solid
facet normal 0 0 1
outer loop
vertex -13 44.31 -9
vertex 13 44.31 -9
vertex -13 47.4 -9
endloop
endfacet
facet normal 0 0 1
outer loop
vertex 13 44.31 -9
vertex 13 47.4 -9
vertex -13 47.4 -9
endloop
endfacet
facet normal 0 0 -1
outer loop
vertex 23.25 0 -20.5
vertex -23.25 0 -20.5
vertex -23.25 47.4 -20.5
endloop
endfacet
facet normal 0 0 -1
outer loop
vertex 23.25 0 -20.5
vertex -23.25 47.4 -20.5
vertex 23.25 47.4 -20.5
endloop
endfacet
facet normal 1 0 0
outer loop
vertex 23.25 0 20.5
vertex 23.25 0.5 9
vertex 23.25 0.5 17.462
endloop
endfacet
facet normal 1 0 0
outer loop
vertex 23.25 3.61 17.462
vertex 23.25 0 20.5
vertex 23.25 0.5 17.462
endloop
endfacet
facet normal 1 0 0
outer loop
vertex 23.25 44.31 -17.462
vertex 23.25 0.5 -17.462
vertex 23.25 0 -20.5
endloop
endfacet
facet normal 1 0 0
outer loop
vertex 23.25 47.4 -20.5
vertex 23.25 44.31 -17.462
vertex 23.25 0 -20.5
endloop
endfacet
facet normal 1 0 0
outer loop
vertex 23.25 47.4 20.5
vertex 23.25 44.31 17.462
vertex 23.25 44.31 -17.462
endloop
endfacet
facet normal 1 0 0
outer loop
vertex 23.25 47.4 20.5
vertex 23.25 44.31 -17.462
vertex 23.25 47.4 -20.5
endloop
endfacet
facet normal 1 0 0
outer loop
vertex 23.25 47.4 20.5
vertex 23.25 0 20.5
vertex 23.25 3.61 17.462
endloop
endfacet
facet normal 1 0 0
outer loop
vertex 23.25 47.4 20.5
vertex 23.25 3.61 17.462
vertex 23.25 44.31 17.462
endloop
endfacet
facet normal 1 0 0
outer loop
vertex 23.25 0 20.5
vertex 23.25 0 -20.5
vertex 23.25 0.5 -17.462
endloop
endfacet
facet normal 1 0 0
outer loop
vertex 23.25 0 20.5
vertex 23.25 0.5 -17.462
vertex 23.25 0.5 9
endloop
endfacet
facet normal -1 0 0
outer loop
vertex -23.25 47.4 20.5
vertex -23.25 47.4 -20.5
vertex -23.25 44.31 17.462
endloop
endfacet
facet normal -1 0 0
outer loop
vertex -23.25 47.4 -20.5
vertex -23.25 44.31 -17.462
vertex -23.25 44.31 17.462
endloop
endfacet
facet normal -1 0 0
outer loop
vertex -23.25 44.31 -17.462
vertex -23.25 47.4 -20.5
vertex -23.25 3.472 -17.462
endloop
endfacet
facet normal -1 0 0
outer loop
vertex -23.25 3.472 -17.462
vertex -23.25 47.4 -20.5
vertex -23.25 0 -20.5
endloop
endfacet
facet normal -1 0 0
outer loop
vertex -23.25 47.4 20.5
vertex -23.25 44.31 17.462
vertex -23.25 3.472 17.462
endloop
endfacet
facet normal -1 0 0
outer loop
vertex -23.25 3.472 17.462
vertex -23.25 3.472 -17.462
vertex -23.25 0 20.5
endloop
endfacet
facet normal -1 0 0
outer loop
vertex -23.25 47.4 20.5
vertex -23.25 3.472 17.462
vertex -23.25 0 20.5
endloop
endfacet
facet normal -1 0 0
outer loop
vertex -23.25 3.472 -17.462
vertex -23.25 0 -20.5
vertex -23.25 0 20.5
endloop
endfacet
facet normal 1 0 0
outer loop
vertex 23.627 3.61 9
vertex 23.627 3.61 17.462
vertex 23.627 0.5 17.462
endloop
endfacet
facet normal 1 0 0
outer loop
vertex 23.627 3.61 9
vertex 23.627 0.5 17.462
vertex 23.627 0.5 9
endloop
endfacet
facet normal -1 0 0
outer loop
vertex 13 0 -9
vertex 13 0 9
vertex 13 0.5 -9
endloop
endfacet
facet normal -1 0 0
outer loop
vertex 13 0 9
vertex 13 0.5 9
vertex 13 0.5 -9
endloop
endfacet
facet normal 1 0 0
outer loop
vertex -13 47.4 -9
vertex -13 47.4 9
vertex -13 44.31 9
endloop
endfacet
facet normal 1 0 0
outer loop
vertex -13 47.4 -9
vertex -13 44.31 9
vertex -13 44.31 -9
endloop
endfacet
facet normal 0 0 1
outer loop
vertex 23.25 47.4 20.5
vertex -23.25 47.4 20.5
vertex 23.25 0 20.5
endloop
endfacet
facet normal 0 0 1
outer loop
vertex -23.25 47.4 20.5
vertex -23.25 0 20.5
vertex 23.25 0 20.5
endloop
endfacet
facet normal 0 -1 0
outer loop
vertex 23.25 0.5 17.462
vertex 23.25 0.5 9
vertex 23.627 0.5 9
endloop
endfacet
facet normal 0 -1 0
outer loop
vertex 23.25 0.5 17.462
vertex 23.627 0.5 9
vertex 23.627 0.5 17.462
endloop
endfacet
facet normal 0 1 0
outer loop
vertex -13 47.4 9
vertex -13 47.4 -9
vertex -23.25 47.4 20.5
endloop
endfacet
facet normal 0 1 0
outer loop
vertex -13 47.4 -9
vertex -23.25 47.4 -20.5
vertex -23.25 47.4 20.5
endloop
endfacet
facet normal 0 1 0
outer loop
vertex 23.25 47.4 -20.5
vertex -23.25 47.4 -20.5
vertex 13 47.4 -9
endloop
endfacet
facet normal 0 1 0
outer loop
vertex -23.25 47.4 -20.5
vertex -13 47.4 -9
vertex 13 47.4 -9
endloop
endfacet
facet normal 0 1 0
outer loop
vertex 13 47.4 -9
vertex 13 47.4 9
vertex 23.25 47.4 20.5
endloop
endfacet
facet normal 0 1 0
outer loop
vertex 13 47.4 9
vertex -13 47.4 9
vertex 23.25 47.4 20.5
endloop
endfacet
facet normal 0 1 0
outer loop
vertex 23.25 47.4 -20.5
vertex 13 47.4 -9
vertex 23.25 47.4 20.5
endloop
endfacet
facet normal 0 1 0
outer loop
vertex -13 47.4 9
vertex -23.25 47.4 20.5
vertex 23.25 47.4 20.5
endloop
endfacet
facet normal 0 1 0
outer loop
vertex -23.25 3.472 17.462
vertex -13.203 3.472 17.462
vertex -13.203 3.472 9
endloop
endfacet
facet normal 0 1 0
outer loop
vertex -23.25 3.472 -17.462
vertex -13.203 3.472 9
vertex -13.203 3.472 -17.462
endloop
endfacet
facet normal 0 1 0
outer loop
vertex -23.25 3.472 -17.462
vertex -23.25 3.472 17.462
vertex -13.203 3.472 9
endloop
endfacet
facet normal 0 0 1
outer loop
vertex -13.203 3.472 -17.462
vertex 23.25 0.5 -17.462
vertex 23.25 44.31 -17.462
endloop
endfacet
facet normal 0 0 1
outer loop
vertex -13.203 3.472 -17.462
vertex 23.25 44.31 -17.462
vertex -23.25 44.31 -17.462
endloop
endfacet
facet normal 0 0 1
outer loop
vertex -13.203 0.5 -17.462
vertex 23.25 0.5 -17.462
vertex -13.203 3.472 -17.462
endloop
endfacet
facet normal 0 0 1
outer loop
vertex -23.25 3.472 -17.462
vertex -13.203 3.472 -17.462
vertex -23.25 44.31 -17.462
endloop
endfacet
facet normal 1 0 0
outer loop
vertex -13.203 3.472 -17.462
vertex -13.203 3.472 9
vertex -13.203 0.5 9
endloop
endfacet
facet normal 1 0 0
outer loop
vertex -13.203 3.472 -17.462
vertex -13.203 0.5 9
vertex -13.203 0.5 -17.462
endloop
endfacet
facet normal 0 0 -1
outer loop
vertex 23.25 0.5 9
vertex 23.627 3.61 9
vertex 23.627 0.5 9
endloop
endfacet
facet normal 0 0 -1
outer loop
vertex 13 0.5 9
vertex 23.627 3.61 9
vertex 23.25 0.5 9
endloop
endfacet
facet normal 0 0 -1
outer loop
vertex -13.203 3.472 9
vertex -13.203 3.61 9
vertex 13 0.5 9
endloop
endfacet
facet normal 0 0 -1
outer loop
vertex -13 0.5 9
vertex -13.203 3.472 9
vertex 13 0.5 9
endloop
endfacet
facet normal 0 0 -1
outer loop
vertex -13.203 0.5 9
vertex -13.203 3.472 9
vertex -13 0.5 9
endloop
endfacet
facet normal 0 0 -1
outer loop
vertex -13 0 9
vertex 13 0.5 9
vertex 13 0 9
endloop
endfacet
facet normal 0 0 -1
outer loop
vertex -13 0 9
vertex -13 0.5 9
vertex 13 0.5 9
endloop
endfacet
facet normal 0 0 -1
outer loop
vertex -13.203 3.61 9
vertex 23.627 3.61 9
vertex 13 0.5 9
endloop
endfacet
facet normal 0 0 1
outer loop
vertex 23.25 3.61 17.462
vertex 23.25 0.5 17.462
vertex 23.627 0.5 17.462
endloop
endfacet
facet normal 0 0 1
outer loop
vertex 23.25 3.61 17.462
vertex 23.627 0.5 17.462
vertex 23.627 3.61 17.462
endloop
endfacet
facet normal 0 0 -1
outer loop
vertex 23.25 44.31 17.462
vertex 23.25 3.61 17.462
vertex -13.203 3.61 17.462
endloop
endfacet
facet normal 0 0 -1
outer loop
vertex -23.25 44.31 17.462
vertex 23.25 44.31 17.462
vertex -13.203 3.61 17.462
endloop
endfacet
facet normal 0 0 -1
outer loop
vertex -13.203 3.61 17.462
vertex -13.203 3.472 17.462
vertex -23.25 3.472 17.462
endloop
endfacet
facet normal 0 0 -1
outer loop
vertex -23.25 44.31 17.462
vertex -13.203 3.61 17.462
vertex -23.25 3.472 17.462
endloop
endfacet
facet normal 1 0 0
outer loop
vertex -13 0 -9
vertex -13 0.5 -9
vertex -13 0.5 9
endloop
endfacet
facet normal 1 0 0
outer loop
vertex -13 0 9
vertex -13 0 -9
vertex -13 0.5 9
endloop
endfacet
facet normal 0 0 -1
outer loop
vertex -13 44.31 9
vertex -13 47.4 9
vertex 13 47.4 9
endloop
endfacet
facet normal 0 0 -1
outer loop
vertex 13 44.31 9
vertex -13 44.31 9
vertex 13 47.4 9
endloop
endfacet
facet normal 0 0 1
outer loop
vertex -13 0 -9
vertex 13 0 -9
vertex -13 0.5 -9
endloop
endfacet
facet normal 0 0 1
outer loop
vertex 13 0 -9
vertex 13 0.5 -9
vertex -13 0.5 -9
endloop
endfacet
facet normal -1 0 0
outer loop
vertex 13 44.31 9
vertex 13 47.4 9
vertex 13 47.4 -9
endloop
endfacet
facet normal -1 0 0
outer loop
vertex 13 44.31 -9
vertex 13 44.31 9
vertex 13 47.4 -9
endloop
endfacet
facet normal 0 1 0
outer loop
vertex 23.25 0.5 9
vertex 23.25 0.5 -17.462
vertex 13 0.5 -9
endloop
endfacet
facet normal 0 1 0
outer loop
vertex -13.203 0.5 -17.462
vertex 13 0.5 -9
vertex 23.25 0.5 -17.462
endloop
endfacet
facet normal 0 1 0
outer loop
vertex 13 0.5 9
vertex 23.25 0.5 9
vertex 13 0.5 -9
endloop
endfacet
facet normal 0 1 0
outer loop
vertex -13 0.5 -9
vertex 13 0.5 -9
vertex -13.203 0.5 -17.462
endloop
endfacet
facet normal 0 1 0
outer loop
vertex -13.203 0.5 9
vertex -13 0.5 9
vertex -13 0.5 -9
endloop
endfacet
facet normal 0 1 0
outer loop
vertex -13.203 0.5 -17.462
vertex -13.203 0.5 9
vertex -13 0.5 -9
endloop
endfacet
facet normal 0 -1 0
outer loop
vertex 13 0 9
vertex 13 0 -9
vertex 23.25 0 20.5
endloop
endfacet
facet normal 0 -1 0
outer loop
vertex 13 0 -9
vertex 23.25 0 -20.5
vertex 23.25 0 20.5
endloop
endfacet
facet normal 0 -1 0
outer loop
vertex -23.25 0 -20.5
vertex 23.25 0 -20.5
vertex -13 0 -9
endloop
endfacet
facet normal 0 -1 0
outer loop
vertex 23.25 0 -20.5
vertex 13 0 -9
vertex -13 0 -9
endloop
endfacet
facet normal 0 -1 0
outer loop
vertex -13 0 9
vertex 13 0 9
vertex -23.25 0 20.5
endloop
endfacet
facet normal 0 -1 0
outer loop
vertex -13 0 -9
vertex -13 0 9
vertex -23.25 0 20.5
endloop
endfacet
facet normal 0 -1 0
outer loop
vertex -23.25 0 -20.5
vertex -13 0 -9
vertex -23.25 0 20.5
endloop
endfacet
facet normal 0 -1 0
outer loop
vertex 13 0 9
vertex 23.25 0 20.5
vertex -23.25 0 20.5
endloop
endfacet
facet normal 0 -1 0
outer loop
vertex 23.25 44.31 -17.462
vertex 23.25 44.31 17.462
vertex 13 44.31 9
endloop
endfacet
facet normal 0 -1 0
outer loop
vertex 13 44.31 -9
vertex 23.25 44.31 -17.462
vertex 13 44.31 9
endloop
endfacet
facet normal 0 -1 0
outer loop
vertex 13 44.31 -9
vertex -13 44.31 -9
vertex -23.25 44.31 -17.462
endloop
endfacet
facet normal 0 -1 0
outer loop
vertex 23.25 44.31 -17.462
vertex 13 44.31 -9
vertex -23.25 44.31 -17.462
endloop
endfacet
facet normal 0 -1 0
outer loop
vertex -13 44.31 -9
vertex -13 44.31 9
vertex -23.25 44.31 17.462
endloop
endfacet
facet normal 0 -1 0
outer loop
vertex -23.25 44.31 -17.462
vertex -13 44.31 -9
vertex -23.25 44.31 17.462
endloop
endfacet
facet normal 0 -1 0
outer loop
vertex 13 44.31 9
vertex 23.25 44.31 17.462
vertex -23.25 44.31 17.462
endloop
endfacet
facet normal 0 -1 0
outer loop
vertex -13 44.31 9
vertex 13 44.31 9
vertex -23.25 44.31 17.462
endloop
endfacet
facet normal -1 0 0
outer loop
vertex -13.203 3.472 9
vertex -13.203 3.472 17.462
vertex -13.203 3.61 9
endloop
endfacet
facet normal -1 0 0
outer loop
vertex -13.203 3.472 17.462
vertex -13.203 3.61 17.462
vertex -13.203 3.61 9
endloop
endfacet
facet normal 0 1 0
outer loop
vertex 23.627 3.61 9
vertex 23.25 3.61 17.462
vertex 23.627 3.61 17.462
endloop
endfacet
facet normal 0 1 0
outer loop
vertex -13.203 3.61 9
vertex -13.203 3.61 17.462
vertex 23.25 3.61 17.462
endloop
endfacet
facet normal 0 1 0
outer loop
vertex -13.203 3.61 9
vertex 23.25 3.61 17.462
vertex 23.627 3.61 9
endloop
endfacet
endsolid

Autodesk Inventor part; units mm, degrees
ref_plane "YZ Plane" through (0, 0, 0) normal (1, 0, 0) x (0, 1, 0)
ref_plane "XZ Plane" through (0, 0, 0) normal (0, 1, 0) x (-1, 0, 0)
ref_plane "XY Plane" through (0, 0, 0) normal (0, 0, 1) x (1, 0, 0)
sketch "Sketch1" plane through (0, 0, 0) normal (0, 1, 0) x (-1, 0, 0)
  point P0 (0, 0)
sketch "Sketch2" plane through (0, 0, 0) normal (0, 1, 0) x (-1, 0, 0)
  line L0 (23.25, -20.5) -> (-23.25, -20.5)
  line L1 (-23.25, -20.5) -> (-23.25, 20.5)
  line L2 (-23.25, 20.5) -> (23.25, 20.5)
  line L3 (23.25, 20.5) -> (23.25, -20.5)
  line L4 (23.25, -20.5) -> (-23.25, 20.5) construction
  line L5 (-23.25, -20.5) -> (23.25, 20.5) construction
  point P0 (0, 0)
  dimension "d0" = 46.5
  dimension "d1" = 41
extrude "Extrusion1" add sketch "Sketch2" along normal blind 0.5
sketch "Sketch3" plane through (0, 0.5, 0) normal (0, 1, 0) x (1, 0, 0)
  line L0 (-13, -9) -> (13, -9)
  line L1 (13, -9) -> (13, 9)
  line L2 (13, 9) -> (-13, 9)
  line L3 (-13, 9) -> (-13, -9)
  line L4 (-13, -9) -> (13, 9) construction
  line L5 (13, -9) -> (-13, 9) construction
  point P0 (0, 0)
  dimension "d4" = 26
  dimension "d5" = 18
extrude "Extrusion2" cut sketch "Sketch3" against normal blind 25.4
sketch "Sketch4" plane through (0, 0.5, 0) normal (0, 1, 0) x (1, 0, 0)
  line L0 (-23.25, 20.5) -> (-23.25, -20.5) projected
  line L1 (23.25, -20.5) -> (23.25, 20.5) projected
  line L2 (-23.25, -20.5) -> (23.25, -20.5)
  line L3 (23.25, -20.5) -> (23.25, -17.4625)
  line L4 (23.25, -17.4625) -> (-23.25, -17.4625)
  line L5 (-23.25, -17.4625) -> (-23.25, -20.5)
  point P0 (0, 0)
extrude "Extrusion3" add sketch "Sketch4" along normal blind 46.9
sketch "Sketch5" plane through (0, 0.5, 0) normal (0, 1, 0) x (1, 0, 0)
  line L0 (-23.25, 20.5) -> (-23.25, -17.4625) projected
  line L1 (-23.25, 20.5) -> (23.25, 20.5)
  line L2 (23.25, 20.5) -> (23.25, 17.4625)
  line L3 (23.25, 17.4625) -> (-23.25, 17.4625)
  line L4 (-23.25, 17.4625) -> (-23.25, 20.5)
  point P0 (0, 0)
extrude "Extrusion4" add sketch "Sketch5" along normal blind 46.9
sketch "Sketch6" plane through (23.25, 0.5, 17.4625) normal (0, 0, -1) x (-1, 0, 0)
  point P0 (23.25, -0.5)
sketch "Sketch7" plane through (23.25, 0.5, 17.4625) normal (0, 0, -1) x (-1, 0, 0)
  point P0 (23.25, -0.5)
sketch "Sketch8" plane through (23.25, 0.5, 17.4625) normal (0, 0, -1) x (-1, 0, 0)
  line L0 (46.5, 0) -> (46.5, 46.9) projected
  line L1 (0, 0) -> (0, 46.9) projected
  line L2 (46.5, 46.9) -> (0, 46.9)
  line L3 (0, 46.9) -> (0, 43.8105)
  line L4 (0, 43.8105) -> (46.5, 43.8105)
  line L5 (46.5, 43.8105) -> (46.5, 46.9)
  point P0 (23.25, -0.5)
extrude "Extrusion5" add sketch "Sketch8" along normal blind 35
sketch "Sketch9" plane through (0, 47.4, 0) normal (0, 1, 0) x (1, 0, 0)
  line L0 (-13, -9) -> (-13, 9) projected
  line L1 (13, 9) -> (-13, 9)
  line L2 (-13, 9) -> (-13, -9)
  line L3 (-13, -9) -> (13, -9)
  line L4 (13, -9) -> (13, 9)
  line L5 (13, 9) -> (-13, -9) construction
  line L6 (-13, 9) -> (13, -9) construction
  point P0 (0, 0)
sketch "Sketch10" plane through (0, 0.5, 0) normal (0, 1, 0) x (1, 0, 0)
  point P0 (0, 0)
sketch "Sketch11" plane through (0, 0.5, 0) normal (0, 1, 0) x (1, 0, 0)
  line L0 (-23.25, -17.4625) -> (23.25, -17.4625) projected
  line L1 (-23.25, -17.4625) -> (-18.283, -17.4625)
  line L2 (-18.283, -17.4625) -> (-18.283, 17.4625)
  line L3 (-18.283, 17.4625) -> (-23.25, 17.4625)
  line L4 (-23.25, 17.4625) -> (-23.25, -17.4625)
  point P0 (0, 0)
extrude "Extrusion6" add sketch "Sketch11" along normal blind 2.9718
extrude "Extrusion7" cut sketch "Sketch9" against normal blind 4.9657
sketch "Sketch12" plane through (0, 0.5, 0) normal (0, 1, 0) x (1, 0, 0)
  point P0 (0, 0)
sketch "Sketch14" plane through (-18.283, 0.5, 17.4625) normal (1, 0, 0) x (0, 0, -1)
  line L0 (0, 2.9718) -> (0, 43.8105) projected
  line L1 (34.925, 0) -> (34.925, 43.8105) projected
  line L2 (0, 2.9718) -> (34.925, 2.9718)
  line L3 (34.925, 2.9718) -> (34.925, 0)
  line L4 (34.925, 0) -> (0, 0)
  line L5 (0, 0) -> (0, 2.9718)
  point P0 (17.4625, -0.5)
extrude "Extrusion9" add sketch "Sketch14" along normal blind 5.08
sketch "Sketch15" plane through (-13.203, 0.5, 17.4625) normal (1, 0, 0) x (0, 0, -1)
  line L0 (0, 0) -> (0, 43.8105) projected
  line L1 (8.4625, 0) -> (26.4625, 0) projected
  line L2 (0, 3.1096) -> (8.4625, 3.1096)
  line L3 (8.4625, 3.1096) -> (8.4625, 0)
  line L4 (8.4625, 0) -> (0, 0)
  line L5 (0, 0) -> (0, 3.1096)
  point P0 (17.4625, -0.5)
extrude "Extrusion10" add sketch "Sketch15" along normal blind 36.83
properties part number "ChamberSurface"
